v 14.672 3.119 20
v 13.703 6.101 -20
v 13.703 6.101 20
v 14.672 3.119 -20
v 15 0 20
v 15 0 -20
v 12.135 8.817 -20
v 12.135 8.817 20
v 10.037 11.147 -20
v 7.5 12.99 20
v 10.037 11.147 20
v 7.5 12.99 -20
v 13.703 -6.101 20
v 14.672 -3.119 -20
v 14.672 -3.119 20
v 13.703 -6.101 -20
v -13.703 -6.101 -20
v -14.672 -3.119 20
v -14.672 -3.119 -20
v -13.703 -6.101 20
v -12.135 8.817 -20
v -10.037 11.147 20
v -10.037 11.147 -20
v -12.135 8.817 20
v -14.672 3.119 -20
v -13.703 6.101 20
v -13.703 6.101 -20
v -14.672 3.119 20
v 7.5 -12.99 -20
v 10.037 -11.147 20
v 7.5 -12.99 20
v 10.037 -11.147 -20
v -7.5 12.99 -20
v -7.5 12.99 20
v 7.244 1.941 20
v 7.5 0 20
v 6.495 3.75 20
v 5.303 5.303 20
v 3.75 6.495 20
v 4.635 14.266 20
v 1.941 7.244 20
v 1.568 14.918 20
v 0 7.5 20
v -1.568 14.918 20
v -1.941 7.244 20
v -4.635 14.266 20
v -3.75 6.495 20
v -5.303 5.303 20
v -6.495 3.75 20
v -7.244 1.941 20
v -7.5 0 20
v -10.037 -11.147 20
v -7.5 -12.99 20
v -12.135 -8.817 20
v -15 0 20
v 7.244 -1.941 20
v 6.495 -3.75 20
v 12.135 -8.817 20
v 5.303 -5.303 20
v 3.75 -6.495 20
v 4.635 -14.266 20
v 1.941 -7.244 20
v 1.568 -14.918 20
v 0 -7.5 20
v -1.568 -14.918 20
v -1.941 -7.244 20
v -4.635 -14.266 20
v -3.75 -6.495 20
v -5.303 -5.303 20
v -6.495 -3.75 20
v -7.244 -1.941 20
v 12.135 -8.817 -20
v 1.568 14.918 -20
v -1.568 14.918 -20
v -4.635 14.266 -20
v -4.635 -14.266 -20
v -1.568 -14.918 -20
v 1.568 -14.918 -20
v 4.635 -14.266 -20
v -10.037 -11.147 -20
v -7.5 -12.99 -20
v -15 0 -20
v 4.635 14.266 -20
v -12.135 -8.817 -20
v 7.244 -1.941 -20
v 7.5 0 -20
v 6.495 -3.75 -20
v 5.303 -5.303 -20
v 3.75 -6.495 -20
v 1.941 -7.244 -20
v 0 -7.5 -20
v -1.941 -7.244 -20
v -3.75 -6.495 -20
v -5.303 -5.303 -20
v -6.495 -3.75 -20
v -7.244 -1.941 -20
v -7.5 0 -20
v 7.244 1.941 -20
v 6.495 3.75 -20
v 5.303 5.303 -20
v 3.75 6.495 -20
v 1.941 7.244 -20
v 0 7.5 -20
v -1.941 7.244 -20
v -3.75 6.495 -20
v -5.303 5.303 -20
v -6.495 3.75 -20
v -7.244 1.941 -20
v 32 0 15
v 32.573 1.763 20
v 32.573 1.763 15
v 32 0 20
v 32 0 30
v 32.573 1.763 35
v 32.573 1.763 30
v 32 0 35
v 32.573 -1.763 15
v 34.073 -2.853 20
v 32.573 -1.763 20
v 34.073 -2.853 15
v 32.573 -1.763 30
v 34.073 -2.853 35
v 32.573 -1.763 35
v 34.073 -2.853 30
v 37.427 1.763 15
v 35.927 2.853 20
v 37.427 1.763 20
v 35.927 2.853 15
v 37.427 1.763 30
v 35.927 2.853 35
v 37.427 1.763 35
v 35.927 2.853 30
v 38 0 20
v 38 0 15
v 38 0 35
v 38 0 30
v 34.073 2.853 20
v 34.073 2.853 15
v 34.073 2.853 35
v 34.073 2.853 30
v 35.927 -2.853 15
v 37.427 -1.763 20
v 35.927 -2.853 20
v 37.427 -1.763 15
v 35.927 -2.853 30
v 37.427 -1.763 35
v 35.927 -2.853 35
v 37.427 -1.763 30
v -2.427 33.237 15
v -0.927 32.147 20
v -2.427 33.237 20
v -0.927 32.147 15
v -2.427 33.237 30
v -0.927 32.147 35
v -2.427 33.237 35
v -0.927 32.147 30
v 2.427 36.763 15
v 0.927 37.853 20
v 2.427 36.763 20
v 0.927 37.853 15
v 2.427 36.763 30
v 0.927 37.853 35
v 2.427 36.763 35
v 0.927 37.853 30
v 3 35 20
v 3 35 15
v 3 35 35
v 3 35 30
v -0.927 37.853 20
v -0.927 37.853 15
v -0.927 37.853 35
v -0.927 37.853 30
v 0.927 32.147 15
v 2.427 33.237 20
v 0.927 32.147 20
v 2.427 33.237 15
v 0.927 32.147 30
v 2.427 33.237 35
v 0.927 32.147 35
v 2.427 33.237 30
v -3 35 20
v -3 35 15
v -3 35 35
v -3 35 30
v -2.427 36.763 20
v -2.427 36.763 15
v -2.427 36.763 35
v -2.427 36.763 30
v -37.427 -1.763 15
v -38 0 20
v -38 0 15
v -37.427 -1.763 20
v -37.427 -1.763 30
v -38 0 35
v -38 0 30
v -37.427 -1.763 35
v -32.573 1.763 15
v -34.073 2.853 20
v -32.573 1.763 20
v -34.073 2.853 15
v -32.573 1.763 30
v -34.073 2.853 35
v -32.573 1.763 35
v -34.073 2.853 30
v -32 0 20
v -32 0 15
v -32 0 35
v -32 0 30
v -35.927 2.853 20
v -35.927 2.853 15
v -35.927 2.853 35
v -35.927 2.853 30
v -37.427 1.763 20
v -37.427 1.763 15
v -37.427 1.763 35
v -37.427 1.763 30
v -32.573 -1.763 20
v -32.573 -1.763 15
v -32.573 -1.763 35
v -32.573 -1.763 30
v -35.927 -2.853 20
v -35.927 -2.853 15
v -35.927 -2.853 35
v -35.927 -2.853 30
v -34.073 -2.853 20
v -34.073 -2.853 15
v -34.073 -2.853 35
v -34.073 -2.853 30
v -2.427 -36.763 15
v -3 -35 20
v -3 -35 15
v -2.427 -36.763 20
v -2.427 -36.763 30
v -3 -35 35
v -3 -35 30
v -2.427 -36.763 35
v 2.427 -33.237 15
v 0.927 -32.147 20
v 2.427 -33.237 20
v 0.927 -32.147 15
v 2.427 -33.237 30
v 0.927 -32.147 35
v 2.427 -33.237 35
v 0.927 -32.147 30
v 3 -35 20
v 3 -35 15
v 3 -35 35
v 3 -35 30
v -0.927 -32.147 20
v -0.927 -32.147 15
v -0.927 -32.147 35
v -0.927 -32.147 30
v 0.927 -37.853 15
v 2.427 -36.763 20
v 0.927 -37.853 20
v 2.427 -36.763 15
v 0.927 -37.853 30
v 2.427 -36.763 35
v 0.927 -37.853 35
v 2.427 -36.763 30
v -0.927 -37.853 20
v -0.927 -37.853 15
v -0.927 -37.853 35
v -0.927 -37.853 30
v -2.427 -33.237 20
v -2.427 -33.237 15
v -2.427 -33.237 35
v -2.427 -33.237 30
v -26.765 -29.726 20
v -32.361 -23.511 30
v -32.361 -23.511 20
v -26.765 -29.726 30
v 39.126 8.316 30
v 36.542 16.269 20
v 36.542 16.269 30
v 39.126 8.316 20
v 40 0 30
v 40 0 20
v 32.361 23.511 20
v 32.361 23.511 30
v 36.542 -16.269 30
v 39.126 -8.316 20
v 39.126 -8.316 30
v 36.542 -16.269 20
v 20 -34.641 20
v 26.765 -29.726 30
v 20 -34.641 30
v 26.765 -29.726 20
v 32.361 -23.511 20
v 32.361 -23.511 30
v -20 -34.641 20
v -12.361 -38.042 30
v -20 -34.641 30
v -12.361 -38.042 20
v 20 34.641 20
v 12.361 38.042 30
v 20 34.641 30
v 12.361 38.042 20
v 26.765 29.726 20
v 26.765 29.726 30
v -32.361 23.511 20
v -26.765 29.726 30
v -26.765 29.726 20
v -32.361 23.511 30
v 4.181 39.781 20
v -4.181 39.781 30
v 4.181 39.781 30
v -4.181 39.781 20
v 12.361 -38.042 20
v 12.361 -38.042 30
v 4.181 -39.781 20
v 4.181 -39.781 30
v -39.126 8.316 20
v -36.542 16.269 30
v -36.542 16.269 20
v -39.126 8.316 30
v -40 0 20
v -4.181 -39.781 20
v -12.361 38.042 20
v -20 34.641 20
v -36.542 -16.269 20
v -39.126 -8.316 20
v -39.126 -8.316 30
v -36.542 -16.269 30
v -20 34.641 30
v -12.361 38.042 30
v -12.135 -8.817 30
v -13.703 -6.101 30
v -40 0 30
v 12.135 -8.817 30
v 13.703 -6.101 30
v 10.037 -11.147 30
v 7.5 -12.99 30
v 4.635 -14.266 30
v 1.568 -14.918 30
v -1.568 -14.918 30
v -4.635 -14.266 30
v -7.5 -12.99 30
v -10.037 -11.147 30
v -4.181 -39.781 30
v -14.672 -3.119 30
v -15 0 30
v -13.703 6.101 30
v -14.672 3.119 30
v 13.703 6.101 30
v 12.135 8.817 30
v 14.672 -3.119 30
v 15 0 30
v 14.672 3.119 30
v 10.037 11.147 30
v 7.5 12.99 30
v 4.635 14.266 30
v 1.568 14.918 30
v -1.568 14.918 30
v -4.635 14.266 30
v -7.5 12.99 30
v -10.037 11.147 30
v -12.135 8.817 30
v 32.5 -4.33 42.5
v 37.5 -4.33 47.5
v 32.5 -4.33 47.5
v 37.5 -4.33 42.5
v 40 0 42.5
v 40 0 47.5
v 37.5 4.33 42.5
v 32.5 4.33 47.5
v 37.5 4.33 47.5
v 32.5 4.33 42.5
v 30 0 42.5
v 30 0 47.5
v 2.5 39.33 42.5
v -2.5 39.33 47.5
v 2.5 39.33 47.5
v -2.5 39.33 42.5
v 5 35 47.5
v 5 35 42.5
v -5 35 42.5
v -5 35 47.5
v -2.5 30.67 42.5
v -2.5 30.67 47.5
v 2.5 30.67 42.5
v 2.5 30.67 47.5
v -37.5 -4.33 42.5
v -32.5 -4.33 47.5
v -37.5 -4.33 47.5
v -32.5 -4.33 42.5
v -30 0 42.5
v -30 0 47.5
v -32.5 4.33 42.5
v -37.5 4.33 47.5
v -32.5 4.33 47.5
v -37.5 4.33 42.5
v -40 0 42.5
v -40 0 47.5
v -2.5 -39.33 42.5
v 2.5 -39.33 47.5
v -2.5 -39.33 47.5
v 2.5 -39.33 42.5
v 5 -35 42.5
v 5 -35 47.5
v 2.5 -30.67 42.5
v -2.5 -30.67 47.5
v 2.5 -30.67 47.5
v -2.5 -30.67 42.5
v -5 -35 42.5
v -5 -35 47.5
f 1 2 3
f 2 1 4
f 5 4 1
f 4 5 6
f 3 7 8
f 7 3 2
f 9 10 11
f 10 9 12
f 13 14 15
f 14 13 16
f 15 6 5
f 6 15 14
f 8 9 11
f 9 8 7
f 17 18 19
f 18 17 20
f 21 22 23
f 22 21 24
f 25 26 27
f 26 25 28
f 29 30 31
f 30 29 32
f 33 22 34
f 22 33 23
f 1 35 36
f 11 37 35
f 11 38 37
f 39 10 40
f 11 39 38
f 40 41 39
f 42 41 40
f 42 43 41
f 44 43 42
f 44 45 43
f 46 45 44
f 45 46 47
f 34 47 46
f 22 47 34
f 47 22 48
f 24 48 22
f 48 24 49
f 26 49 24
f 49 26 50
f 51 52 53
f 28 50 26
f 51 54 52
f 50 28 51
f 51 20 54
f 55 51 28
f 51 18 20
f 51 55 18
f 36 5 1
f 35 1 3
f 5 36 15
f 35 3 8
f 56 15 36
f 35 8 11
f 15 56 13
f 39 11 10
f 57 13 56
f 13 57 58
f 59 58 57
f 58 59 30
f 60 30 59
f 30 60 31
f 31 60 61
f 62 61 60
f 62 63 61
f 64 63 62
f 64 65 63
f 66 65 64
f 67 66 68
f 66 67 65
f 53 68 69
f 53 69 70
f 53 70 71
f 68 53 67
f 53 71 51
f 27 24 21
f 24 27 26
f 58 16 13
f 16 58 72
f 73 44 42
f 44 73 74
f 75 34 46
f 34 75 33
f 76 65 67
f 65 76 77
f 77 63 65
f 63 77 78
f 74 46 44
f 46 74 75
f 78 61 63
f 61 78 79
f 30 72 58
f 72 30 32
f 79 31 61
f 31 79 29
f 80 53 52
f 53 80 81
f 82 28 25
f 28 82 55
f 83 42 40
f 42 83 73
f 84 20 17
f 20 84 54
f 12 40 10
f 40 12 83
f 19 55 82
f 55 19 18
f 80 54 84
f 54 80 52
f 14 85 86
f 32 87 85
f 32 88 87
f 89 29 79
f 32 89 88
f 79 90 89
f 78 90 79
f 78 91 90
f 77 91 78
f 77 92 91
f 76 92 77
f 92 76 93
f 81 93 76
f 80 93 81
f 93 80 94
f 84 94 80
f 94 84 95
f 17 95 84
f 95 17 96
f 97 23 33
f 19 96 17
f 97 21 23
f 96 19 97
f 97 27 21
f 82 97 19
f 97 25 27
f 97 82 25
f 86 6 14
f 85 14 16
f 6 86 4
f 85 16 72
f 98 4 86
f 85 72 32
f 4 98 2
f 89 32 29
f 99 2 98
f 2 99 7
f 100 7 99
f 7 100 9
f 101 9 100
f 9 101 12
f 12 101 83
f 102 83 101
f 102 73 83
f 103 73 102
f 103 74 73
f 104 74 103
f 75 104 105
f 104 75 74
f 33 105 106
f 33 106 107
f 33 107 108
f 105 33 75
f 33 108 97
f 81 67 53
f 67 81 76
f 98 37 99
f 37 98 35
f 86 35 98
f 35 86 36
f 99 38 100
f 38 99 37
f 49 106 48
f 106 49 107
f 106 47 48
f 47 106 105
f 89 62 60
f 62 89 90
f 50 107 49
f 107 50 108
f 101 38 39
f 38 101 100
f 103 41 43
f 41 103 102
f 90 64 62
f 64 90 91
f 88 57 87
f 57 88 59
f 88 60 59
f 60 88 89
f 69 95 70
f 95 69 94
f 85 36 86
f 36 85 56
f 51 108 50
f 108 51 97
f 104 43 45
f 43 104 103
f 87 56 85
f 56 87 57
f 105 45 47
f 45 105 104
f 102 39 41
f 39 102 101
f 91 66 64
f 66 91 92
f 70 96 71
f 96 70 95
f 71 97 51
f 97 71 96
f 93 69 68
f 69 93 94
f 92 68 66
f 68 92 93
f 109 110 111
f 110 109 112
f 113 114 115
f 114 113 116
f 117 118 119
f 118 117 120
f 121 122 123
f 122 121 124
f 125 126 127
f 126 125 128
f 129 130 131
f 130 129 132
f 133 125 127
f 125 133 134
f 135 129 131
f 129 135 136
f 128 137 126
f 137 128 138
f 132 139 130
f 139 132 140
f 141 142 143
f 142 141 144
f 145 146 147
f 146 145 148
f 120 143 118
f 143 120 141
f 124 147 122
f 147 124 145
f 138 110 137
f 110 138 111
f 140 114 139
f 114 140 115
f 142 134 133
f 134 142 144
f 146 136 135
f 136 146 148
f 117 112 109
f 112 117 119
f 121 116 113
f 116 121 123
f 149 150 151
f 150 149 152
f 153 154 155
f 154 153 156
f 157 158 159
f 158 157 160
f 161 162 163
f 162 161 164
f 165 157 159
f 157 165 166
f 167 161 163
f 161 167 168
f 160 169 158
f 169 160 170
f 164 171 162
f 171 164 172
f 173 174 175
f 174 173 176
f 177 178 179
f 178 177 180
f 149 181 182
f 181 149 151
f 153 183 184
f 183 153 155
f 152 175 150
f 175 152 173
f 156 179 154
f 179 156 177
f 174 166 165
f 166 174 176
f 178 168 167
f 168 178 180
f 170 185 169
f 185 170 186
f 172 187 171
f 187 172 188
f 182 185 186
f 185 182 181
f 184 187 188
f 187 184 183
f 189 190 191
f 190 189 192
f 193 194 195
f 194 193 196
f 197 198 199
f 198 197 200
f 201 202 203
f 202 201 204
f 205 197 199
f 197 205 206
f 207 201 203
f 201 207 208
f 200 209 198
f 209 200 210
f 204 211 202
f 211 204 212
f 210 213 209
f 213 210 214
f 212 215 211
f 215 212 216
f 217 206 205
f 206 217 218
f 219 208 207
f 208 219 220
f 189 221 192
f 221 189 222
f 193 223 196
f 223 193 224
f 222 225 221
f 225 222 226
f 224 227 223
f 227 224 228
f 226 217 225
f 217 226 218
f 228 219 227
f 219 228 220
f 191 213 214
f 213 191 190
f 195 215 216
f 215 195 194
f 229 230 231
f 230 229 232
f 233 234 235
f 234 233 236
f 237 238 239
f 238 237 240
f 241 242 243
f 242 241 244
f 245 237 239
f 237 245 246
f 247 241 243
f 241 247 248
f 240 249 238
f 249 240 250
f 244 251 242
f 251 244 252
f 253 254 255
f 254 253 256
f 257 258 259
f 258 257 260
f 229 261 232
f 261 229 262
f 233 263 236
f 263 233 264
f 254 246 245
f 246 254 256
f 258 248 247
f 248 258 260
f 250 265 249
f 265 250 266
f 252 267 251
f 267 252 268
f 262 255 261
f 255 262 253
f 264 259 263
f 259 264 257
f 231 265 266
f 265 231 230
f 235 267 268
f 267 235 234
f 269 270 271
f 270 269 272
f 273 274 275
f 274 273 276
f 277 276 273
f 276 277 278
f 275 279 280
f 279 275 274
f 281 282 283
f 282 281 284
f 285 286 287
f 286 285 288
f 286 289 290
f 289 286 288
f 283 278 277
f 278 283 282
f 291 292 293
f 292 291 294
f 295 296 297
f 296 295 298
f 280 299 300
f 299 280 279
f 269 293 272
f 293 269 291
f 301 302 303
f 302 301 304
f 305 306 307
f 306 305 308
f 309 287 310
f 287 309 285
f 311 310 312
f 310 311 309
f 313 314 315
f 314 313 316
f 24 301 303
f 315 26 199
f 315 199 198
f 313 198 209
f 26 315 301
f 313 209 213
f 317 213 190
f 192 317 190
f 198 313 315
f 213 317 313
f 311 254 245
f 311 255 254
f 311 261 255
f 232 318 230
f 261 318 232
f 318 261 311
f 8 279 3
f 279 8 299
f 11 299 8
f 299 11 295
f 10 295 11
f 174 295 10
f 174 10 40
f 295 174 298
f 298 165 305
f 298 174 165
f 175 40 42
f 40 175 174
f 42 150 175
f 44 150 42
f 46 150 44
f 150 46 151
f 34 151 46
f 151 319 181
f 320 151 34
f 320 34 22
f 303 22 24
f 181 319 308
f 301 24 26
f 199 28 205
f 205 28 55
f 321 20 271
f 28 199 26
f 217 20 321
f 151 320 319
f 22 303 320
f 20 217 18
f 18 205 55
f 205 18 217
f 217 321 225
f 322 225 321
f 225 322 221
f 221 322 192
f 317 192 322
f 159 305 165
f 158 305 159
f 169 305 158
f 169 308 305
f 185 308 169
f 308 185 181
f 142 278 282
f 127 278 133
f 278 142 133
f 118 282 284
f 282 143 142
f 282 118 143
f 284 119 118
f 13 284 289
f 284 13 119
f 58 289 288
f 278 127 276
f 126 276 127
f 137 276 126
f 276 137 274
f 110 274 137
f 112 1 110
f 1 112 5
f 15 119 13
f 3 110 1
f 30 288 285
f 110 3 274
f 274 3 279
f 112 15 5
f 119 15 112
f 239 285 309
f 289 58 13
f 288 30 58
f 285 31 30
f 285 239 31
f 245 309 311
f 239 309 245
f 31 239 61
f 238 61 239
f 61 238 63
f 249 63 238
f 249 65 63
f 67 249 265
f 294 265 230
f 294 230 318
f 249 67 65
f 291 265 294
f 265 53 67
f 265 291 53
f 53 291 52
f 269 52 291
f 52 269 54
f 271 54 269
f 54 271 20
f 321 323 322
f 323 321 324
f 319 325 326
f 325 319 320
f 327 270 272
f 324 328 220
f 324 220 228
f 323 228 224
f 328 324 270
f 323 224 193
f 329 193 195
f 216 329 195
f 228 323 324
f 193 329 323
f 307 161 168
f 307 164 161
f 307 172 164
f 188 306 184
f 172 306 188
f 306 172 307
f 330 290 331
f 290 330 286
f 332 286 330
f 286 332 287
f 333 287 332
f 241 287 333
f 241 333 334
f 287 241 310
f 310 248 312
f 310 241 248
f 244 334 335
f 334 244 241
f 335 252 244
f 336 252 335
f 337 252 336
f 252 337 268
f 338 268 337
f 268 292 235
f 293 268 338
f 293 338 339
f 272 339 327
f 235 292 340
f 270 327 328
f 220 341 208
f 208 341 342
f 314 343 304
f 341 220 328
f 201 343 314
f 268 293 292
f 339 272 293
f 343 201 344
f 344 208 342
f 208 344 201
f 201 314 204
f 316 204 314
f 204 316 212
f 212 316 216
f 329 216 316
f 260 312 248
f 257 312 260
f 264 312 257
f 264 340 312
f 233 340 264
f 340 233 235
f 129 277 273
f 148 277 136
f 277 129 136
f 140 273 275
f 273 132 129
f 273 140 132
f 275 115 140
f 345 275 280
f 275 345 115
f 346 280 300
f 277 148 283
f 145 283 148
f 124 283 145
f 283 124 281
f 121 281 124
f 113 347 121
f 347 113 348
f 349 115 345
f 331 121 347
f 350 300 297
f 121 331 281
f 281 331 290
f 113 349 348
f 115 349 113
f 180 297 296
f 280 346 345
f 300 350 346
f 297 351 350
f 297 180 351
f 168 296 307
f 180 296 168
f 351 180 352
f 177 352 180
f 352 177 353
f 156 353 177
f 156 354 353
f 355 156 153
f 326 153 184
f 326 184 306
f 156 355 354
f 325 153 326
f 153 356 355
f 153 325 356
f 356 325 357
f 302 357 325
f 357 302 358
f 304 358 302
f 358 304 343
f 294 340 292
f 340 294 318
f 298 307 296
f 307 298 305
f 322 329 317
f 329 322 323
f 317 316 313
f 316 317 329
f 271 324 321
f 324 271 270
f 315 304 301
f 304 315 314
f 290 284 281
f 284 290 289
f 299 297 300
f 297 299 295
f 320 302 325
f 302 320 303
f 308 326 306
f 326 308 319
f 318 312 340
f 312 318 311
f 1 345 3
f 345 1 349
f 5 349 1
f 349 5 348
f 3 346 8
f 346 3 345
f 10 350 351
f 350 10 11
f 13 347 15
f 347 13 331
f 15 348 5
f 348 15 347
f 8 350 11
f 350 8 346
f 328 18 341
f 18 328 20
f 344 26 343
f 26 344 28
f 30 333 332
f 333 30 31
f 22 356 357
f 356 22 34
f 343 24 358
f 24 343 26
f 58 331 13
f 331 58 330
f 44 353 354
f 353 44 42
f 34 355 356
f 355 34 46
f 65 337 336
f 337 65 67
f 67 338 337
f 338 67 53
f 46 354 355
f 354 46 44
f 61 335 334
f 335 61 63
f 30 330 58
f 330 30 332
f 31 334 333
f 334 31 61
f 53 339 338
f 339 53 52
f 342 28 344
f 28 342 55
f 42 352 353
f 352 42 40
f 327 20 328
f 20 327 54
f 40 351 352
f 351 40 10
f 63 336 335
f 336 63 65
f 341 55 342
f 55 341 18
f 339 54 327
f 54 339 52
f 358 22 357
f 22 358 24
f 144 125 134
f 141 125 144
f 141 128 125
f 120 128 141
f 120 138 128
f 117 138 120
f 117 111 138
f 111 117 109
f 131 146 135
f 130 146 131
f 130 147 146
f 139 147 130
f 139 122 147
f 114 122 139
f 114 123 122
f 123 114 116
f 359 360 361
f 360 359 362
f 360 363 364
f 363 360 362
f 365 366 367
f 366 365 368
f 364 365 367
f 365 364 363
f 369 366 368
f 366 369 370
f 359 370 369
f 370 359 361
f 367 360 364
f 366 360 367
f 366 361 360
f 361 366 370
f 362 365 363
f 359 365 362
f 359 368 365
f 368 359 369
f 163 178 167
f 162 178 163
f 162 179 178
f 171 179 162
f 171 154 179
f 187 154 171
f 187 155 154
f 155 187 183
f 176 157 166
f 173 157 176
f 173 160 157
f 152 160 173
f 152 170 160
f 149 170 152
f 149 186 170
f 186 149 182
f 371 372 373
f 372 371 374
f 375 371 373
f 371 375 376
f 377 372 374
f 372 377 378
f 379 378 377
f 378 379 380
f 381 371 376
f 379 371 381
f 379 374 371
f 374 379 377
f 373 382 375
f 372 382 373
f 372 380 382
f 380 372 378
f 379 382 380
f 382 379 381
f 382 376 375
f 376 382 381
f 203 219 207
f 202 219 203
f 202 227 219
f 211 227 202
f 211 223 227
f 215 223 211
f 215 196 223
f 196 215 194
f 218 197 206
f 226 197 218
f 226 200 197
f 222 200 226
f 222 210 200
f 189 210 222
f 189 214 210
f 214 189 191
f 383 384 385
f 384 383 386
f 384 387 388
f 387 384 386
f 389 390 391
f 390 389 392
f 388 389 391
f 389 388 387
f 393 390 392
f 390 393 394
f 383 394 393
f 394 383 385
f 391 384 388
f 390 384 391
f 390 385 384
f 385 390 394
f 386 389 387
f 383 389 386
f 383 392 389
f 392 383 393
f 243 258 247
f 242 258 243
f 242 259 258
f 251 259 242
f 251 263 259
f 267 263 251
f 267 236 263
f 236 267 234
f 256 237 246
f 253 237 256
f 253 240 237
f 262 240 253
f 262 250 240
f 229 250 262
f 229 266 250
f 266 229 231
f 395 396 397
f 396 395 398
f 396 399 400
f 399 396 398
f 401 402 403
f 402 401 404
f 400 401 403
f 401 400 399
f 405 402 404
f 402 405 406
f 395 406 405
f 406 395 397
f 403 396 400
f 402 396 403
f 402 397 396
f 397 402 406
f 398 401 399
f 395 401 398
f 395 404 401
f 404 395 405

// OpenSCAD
// Parameters
hub_diameter = 30;
hub_length = 40;
shaft_hole_diameter = 15;
flange_diameter = 80;
flange_thickness = 10;
bolt_hole_radius = 35;
bolt_diameter = 6;
bolt_length = 20;
nut_size = 10;
num_bolts = 4;

// Hub module
module hub() {
    difference() {
        cylinder(d=hub_diameter, h=hub_length, center=true);
        cylinder(d=shaft_hole_diameter, h=hub_length+2, center=true);
    }
}

// Flange module
module flange() {
    difference() {
        cylinder(d=flange_diameter, h=flange_thickness, center=true);
        cylinder(d=hub_diameter, h=flange_thickness+2, center=true);
        for (i = [0:num_bolts-1]) {
            angle = i * 360 / num_bolts;
            translate([bolt_hole_radius * cos(angle), bolt_hole_radius * sin(angle), 0])
                cylinder(d=bolt_diameter, h=flange_thickness+2, center=true);
        }
    }
}

// Bolt module
module bolt() {
    cylinder(d=bolt_diameter, h=bolt_length, center=true);
}

// Nut module
module nut() {
    cylinder(d=nut_size, h=5, $fn=6, center=true);
}

// Assemble the components
module assembly() {
    hub();
    translate([0, 0, hub_length/2 + flange_thickness/2]) flange();
    for (i = [0:num_bolts-1]) {
        angle = i * 360 / num_bolts;
        translate([bolt_hole_radius * cos(angle), bolt_hole_radius * sin(angle), hub_length/2 + flange_thickness/2])
            bolt();
        translate([bolt_hole_radius * cos(angle), bolt_hole_radius * sin(angle), hub_length/2 + flange_thickness/2 + bolt_length])
            nut();
    }
}

// Render the assembly
assembly();
